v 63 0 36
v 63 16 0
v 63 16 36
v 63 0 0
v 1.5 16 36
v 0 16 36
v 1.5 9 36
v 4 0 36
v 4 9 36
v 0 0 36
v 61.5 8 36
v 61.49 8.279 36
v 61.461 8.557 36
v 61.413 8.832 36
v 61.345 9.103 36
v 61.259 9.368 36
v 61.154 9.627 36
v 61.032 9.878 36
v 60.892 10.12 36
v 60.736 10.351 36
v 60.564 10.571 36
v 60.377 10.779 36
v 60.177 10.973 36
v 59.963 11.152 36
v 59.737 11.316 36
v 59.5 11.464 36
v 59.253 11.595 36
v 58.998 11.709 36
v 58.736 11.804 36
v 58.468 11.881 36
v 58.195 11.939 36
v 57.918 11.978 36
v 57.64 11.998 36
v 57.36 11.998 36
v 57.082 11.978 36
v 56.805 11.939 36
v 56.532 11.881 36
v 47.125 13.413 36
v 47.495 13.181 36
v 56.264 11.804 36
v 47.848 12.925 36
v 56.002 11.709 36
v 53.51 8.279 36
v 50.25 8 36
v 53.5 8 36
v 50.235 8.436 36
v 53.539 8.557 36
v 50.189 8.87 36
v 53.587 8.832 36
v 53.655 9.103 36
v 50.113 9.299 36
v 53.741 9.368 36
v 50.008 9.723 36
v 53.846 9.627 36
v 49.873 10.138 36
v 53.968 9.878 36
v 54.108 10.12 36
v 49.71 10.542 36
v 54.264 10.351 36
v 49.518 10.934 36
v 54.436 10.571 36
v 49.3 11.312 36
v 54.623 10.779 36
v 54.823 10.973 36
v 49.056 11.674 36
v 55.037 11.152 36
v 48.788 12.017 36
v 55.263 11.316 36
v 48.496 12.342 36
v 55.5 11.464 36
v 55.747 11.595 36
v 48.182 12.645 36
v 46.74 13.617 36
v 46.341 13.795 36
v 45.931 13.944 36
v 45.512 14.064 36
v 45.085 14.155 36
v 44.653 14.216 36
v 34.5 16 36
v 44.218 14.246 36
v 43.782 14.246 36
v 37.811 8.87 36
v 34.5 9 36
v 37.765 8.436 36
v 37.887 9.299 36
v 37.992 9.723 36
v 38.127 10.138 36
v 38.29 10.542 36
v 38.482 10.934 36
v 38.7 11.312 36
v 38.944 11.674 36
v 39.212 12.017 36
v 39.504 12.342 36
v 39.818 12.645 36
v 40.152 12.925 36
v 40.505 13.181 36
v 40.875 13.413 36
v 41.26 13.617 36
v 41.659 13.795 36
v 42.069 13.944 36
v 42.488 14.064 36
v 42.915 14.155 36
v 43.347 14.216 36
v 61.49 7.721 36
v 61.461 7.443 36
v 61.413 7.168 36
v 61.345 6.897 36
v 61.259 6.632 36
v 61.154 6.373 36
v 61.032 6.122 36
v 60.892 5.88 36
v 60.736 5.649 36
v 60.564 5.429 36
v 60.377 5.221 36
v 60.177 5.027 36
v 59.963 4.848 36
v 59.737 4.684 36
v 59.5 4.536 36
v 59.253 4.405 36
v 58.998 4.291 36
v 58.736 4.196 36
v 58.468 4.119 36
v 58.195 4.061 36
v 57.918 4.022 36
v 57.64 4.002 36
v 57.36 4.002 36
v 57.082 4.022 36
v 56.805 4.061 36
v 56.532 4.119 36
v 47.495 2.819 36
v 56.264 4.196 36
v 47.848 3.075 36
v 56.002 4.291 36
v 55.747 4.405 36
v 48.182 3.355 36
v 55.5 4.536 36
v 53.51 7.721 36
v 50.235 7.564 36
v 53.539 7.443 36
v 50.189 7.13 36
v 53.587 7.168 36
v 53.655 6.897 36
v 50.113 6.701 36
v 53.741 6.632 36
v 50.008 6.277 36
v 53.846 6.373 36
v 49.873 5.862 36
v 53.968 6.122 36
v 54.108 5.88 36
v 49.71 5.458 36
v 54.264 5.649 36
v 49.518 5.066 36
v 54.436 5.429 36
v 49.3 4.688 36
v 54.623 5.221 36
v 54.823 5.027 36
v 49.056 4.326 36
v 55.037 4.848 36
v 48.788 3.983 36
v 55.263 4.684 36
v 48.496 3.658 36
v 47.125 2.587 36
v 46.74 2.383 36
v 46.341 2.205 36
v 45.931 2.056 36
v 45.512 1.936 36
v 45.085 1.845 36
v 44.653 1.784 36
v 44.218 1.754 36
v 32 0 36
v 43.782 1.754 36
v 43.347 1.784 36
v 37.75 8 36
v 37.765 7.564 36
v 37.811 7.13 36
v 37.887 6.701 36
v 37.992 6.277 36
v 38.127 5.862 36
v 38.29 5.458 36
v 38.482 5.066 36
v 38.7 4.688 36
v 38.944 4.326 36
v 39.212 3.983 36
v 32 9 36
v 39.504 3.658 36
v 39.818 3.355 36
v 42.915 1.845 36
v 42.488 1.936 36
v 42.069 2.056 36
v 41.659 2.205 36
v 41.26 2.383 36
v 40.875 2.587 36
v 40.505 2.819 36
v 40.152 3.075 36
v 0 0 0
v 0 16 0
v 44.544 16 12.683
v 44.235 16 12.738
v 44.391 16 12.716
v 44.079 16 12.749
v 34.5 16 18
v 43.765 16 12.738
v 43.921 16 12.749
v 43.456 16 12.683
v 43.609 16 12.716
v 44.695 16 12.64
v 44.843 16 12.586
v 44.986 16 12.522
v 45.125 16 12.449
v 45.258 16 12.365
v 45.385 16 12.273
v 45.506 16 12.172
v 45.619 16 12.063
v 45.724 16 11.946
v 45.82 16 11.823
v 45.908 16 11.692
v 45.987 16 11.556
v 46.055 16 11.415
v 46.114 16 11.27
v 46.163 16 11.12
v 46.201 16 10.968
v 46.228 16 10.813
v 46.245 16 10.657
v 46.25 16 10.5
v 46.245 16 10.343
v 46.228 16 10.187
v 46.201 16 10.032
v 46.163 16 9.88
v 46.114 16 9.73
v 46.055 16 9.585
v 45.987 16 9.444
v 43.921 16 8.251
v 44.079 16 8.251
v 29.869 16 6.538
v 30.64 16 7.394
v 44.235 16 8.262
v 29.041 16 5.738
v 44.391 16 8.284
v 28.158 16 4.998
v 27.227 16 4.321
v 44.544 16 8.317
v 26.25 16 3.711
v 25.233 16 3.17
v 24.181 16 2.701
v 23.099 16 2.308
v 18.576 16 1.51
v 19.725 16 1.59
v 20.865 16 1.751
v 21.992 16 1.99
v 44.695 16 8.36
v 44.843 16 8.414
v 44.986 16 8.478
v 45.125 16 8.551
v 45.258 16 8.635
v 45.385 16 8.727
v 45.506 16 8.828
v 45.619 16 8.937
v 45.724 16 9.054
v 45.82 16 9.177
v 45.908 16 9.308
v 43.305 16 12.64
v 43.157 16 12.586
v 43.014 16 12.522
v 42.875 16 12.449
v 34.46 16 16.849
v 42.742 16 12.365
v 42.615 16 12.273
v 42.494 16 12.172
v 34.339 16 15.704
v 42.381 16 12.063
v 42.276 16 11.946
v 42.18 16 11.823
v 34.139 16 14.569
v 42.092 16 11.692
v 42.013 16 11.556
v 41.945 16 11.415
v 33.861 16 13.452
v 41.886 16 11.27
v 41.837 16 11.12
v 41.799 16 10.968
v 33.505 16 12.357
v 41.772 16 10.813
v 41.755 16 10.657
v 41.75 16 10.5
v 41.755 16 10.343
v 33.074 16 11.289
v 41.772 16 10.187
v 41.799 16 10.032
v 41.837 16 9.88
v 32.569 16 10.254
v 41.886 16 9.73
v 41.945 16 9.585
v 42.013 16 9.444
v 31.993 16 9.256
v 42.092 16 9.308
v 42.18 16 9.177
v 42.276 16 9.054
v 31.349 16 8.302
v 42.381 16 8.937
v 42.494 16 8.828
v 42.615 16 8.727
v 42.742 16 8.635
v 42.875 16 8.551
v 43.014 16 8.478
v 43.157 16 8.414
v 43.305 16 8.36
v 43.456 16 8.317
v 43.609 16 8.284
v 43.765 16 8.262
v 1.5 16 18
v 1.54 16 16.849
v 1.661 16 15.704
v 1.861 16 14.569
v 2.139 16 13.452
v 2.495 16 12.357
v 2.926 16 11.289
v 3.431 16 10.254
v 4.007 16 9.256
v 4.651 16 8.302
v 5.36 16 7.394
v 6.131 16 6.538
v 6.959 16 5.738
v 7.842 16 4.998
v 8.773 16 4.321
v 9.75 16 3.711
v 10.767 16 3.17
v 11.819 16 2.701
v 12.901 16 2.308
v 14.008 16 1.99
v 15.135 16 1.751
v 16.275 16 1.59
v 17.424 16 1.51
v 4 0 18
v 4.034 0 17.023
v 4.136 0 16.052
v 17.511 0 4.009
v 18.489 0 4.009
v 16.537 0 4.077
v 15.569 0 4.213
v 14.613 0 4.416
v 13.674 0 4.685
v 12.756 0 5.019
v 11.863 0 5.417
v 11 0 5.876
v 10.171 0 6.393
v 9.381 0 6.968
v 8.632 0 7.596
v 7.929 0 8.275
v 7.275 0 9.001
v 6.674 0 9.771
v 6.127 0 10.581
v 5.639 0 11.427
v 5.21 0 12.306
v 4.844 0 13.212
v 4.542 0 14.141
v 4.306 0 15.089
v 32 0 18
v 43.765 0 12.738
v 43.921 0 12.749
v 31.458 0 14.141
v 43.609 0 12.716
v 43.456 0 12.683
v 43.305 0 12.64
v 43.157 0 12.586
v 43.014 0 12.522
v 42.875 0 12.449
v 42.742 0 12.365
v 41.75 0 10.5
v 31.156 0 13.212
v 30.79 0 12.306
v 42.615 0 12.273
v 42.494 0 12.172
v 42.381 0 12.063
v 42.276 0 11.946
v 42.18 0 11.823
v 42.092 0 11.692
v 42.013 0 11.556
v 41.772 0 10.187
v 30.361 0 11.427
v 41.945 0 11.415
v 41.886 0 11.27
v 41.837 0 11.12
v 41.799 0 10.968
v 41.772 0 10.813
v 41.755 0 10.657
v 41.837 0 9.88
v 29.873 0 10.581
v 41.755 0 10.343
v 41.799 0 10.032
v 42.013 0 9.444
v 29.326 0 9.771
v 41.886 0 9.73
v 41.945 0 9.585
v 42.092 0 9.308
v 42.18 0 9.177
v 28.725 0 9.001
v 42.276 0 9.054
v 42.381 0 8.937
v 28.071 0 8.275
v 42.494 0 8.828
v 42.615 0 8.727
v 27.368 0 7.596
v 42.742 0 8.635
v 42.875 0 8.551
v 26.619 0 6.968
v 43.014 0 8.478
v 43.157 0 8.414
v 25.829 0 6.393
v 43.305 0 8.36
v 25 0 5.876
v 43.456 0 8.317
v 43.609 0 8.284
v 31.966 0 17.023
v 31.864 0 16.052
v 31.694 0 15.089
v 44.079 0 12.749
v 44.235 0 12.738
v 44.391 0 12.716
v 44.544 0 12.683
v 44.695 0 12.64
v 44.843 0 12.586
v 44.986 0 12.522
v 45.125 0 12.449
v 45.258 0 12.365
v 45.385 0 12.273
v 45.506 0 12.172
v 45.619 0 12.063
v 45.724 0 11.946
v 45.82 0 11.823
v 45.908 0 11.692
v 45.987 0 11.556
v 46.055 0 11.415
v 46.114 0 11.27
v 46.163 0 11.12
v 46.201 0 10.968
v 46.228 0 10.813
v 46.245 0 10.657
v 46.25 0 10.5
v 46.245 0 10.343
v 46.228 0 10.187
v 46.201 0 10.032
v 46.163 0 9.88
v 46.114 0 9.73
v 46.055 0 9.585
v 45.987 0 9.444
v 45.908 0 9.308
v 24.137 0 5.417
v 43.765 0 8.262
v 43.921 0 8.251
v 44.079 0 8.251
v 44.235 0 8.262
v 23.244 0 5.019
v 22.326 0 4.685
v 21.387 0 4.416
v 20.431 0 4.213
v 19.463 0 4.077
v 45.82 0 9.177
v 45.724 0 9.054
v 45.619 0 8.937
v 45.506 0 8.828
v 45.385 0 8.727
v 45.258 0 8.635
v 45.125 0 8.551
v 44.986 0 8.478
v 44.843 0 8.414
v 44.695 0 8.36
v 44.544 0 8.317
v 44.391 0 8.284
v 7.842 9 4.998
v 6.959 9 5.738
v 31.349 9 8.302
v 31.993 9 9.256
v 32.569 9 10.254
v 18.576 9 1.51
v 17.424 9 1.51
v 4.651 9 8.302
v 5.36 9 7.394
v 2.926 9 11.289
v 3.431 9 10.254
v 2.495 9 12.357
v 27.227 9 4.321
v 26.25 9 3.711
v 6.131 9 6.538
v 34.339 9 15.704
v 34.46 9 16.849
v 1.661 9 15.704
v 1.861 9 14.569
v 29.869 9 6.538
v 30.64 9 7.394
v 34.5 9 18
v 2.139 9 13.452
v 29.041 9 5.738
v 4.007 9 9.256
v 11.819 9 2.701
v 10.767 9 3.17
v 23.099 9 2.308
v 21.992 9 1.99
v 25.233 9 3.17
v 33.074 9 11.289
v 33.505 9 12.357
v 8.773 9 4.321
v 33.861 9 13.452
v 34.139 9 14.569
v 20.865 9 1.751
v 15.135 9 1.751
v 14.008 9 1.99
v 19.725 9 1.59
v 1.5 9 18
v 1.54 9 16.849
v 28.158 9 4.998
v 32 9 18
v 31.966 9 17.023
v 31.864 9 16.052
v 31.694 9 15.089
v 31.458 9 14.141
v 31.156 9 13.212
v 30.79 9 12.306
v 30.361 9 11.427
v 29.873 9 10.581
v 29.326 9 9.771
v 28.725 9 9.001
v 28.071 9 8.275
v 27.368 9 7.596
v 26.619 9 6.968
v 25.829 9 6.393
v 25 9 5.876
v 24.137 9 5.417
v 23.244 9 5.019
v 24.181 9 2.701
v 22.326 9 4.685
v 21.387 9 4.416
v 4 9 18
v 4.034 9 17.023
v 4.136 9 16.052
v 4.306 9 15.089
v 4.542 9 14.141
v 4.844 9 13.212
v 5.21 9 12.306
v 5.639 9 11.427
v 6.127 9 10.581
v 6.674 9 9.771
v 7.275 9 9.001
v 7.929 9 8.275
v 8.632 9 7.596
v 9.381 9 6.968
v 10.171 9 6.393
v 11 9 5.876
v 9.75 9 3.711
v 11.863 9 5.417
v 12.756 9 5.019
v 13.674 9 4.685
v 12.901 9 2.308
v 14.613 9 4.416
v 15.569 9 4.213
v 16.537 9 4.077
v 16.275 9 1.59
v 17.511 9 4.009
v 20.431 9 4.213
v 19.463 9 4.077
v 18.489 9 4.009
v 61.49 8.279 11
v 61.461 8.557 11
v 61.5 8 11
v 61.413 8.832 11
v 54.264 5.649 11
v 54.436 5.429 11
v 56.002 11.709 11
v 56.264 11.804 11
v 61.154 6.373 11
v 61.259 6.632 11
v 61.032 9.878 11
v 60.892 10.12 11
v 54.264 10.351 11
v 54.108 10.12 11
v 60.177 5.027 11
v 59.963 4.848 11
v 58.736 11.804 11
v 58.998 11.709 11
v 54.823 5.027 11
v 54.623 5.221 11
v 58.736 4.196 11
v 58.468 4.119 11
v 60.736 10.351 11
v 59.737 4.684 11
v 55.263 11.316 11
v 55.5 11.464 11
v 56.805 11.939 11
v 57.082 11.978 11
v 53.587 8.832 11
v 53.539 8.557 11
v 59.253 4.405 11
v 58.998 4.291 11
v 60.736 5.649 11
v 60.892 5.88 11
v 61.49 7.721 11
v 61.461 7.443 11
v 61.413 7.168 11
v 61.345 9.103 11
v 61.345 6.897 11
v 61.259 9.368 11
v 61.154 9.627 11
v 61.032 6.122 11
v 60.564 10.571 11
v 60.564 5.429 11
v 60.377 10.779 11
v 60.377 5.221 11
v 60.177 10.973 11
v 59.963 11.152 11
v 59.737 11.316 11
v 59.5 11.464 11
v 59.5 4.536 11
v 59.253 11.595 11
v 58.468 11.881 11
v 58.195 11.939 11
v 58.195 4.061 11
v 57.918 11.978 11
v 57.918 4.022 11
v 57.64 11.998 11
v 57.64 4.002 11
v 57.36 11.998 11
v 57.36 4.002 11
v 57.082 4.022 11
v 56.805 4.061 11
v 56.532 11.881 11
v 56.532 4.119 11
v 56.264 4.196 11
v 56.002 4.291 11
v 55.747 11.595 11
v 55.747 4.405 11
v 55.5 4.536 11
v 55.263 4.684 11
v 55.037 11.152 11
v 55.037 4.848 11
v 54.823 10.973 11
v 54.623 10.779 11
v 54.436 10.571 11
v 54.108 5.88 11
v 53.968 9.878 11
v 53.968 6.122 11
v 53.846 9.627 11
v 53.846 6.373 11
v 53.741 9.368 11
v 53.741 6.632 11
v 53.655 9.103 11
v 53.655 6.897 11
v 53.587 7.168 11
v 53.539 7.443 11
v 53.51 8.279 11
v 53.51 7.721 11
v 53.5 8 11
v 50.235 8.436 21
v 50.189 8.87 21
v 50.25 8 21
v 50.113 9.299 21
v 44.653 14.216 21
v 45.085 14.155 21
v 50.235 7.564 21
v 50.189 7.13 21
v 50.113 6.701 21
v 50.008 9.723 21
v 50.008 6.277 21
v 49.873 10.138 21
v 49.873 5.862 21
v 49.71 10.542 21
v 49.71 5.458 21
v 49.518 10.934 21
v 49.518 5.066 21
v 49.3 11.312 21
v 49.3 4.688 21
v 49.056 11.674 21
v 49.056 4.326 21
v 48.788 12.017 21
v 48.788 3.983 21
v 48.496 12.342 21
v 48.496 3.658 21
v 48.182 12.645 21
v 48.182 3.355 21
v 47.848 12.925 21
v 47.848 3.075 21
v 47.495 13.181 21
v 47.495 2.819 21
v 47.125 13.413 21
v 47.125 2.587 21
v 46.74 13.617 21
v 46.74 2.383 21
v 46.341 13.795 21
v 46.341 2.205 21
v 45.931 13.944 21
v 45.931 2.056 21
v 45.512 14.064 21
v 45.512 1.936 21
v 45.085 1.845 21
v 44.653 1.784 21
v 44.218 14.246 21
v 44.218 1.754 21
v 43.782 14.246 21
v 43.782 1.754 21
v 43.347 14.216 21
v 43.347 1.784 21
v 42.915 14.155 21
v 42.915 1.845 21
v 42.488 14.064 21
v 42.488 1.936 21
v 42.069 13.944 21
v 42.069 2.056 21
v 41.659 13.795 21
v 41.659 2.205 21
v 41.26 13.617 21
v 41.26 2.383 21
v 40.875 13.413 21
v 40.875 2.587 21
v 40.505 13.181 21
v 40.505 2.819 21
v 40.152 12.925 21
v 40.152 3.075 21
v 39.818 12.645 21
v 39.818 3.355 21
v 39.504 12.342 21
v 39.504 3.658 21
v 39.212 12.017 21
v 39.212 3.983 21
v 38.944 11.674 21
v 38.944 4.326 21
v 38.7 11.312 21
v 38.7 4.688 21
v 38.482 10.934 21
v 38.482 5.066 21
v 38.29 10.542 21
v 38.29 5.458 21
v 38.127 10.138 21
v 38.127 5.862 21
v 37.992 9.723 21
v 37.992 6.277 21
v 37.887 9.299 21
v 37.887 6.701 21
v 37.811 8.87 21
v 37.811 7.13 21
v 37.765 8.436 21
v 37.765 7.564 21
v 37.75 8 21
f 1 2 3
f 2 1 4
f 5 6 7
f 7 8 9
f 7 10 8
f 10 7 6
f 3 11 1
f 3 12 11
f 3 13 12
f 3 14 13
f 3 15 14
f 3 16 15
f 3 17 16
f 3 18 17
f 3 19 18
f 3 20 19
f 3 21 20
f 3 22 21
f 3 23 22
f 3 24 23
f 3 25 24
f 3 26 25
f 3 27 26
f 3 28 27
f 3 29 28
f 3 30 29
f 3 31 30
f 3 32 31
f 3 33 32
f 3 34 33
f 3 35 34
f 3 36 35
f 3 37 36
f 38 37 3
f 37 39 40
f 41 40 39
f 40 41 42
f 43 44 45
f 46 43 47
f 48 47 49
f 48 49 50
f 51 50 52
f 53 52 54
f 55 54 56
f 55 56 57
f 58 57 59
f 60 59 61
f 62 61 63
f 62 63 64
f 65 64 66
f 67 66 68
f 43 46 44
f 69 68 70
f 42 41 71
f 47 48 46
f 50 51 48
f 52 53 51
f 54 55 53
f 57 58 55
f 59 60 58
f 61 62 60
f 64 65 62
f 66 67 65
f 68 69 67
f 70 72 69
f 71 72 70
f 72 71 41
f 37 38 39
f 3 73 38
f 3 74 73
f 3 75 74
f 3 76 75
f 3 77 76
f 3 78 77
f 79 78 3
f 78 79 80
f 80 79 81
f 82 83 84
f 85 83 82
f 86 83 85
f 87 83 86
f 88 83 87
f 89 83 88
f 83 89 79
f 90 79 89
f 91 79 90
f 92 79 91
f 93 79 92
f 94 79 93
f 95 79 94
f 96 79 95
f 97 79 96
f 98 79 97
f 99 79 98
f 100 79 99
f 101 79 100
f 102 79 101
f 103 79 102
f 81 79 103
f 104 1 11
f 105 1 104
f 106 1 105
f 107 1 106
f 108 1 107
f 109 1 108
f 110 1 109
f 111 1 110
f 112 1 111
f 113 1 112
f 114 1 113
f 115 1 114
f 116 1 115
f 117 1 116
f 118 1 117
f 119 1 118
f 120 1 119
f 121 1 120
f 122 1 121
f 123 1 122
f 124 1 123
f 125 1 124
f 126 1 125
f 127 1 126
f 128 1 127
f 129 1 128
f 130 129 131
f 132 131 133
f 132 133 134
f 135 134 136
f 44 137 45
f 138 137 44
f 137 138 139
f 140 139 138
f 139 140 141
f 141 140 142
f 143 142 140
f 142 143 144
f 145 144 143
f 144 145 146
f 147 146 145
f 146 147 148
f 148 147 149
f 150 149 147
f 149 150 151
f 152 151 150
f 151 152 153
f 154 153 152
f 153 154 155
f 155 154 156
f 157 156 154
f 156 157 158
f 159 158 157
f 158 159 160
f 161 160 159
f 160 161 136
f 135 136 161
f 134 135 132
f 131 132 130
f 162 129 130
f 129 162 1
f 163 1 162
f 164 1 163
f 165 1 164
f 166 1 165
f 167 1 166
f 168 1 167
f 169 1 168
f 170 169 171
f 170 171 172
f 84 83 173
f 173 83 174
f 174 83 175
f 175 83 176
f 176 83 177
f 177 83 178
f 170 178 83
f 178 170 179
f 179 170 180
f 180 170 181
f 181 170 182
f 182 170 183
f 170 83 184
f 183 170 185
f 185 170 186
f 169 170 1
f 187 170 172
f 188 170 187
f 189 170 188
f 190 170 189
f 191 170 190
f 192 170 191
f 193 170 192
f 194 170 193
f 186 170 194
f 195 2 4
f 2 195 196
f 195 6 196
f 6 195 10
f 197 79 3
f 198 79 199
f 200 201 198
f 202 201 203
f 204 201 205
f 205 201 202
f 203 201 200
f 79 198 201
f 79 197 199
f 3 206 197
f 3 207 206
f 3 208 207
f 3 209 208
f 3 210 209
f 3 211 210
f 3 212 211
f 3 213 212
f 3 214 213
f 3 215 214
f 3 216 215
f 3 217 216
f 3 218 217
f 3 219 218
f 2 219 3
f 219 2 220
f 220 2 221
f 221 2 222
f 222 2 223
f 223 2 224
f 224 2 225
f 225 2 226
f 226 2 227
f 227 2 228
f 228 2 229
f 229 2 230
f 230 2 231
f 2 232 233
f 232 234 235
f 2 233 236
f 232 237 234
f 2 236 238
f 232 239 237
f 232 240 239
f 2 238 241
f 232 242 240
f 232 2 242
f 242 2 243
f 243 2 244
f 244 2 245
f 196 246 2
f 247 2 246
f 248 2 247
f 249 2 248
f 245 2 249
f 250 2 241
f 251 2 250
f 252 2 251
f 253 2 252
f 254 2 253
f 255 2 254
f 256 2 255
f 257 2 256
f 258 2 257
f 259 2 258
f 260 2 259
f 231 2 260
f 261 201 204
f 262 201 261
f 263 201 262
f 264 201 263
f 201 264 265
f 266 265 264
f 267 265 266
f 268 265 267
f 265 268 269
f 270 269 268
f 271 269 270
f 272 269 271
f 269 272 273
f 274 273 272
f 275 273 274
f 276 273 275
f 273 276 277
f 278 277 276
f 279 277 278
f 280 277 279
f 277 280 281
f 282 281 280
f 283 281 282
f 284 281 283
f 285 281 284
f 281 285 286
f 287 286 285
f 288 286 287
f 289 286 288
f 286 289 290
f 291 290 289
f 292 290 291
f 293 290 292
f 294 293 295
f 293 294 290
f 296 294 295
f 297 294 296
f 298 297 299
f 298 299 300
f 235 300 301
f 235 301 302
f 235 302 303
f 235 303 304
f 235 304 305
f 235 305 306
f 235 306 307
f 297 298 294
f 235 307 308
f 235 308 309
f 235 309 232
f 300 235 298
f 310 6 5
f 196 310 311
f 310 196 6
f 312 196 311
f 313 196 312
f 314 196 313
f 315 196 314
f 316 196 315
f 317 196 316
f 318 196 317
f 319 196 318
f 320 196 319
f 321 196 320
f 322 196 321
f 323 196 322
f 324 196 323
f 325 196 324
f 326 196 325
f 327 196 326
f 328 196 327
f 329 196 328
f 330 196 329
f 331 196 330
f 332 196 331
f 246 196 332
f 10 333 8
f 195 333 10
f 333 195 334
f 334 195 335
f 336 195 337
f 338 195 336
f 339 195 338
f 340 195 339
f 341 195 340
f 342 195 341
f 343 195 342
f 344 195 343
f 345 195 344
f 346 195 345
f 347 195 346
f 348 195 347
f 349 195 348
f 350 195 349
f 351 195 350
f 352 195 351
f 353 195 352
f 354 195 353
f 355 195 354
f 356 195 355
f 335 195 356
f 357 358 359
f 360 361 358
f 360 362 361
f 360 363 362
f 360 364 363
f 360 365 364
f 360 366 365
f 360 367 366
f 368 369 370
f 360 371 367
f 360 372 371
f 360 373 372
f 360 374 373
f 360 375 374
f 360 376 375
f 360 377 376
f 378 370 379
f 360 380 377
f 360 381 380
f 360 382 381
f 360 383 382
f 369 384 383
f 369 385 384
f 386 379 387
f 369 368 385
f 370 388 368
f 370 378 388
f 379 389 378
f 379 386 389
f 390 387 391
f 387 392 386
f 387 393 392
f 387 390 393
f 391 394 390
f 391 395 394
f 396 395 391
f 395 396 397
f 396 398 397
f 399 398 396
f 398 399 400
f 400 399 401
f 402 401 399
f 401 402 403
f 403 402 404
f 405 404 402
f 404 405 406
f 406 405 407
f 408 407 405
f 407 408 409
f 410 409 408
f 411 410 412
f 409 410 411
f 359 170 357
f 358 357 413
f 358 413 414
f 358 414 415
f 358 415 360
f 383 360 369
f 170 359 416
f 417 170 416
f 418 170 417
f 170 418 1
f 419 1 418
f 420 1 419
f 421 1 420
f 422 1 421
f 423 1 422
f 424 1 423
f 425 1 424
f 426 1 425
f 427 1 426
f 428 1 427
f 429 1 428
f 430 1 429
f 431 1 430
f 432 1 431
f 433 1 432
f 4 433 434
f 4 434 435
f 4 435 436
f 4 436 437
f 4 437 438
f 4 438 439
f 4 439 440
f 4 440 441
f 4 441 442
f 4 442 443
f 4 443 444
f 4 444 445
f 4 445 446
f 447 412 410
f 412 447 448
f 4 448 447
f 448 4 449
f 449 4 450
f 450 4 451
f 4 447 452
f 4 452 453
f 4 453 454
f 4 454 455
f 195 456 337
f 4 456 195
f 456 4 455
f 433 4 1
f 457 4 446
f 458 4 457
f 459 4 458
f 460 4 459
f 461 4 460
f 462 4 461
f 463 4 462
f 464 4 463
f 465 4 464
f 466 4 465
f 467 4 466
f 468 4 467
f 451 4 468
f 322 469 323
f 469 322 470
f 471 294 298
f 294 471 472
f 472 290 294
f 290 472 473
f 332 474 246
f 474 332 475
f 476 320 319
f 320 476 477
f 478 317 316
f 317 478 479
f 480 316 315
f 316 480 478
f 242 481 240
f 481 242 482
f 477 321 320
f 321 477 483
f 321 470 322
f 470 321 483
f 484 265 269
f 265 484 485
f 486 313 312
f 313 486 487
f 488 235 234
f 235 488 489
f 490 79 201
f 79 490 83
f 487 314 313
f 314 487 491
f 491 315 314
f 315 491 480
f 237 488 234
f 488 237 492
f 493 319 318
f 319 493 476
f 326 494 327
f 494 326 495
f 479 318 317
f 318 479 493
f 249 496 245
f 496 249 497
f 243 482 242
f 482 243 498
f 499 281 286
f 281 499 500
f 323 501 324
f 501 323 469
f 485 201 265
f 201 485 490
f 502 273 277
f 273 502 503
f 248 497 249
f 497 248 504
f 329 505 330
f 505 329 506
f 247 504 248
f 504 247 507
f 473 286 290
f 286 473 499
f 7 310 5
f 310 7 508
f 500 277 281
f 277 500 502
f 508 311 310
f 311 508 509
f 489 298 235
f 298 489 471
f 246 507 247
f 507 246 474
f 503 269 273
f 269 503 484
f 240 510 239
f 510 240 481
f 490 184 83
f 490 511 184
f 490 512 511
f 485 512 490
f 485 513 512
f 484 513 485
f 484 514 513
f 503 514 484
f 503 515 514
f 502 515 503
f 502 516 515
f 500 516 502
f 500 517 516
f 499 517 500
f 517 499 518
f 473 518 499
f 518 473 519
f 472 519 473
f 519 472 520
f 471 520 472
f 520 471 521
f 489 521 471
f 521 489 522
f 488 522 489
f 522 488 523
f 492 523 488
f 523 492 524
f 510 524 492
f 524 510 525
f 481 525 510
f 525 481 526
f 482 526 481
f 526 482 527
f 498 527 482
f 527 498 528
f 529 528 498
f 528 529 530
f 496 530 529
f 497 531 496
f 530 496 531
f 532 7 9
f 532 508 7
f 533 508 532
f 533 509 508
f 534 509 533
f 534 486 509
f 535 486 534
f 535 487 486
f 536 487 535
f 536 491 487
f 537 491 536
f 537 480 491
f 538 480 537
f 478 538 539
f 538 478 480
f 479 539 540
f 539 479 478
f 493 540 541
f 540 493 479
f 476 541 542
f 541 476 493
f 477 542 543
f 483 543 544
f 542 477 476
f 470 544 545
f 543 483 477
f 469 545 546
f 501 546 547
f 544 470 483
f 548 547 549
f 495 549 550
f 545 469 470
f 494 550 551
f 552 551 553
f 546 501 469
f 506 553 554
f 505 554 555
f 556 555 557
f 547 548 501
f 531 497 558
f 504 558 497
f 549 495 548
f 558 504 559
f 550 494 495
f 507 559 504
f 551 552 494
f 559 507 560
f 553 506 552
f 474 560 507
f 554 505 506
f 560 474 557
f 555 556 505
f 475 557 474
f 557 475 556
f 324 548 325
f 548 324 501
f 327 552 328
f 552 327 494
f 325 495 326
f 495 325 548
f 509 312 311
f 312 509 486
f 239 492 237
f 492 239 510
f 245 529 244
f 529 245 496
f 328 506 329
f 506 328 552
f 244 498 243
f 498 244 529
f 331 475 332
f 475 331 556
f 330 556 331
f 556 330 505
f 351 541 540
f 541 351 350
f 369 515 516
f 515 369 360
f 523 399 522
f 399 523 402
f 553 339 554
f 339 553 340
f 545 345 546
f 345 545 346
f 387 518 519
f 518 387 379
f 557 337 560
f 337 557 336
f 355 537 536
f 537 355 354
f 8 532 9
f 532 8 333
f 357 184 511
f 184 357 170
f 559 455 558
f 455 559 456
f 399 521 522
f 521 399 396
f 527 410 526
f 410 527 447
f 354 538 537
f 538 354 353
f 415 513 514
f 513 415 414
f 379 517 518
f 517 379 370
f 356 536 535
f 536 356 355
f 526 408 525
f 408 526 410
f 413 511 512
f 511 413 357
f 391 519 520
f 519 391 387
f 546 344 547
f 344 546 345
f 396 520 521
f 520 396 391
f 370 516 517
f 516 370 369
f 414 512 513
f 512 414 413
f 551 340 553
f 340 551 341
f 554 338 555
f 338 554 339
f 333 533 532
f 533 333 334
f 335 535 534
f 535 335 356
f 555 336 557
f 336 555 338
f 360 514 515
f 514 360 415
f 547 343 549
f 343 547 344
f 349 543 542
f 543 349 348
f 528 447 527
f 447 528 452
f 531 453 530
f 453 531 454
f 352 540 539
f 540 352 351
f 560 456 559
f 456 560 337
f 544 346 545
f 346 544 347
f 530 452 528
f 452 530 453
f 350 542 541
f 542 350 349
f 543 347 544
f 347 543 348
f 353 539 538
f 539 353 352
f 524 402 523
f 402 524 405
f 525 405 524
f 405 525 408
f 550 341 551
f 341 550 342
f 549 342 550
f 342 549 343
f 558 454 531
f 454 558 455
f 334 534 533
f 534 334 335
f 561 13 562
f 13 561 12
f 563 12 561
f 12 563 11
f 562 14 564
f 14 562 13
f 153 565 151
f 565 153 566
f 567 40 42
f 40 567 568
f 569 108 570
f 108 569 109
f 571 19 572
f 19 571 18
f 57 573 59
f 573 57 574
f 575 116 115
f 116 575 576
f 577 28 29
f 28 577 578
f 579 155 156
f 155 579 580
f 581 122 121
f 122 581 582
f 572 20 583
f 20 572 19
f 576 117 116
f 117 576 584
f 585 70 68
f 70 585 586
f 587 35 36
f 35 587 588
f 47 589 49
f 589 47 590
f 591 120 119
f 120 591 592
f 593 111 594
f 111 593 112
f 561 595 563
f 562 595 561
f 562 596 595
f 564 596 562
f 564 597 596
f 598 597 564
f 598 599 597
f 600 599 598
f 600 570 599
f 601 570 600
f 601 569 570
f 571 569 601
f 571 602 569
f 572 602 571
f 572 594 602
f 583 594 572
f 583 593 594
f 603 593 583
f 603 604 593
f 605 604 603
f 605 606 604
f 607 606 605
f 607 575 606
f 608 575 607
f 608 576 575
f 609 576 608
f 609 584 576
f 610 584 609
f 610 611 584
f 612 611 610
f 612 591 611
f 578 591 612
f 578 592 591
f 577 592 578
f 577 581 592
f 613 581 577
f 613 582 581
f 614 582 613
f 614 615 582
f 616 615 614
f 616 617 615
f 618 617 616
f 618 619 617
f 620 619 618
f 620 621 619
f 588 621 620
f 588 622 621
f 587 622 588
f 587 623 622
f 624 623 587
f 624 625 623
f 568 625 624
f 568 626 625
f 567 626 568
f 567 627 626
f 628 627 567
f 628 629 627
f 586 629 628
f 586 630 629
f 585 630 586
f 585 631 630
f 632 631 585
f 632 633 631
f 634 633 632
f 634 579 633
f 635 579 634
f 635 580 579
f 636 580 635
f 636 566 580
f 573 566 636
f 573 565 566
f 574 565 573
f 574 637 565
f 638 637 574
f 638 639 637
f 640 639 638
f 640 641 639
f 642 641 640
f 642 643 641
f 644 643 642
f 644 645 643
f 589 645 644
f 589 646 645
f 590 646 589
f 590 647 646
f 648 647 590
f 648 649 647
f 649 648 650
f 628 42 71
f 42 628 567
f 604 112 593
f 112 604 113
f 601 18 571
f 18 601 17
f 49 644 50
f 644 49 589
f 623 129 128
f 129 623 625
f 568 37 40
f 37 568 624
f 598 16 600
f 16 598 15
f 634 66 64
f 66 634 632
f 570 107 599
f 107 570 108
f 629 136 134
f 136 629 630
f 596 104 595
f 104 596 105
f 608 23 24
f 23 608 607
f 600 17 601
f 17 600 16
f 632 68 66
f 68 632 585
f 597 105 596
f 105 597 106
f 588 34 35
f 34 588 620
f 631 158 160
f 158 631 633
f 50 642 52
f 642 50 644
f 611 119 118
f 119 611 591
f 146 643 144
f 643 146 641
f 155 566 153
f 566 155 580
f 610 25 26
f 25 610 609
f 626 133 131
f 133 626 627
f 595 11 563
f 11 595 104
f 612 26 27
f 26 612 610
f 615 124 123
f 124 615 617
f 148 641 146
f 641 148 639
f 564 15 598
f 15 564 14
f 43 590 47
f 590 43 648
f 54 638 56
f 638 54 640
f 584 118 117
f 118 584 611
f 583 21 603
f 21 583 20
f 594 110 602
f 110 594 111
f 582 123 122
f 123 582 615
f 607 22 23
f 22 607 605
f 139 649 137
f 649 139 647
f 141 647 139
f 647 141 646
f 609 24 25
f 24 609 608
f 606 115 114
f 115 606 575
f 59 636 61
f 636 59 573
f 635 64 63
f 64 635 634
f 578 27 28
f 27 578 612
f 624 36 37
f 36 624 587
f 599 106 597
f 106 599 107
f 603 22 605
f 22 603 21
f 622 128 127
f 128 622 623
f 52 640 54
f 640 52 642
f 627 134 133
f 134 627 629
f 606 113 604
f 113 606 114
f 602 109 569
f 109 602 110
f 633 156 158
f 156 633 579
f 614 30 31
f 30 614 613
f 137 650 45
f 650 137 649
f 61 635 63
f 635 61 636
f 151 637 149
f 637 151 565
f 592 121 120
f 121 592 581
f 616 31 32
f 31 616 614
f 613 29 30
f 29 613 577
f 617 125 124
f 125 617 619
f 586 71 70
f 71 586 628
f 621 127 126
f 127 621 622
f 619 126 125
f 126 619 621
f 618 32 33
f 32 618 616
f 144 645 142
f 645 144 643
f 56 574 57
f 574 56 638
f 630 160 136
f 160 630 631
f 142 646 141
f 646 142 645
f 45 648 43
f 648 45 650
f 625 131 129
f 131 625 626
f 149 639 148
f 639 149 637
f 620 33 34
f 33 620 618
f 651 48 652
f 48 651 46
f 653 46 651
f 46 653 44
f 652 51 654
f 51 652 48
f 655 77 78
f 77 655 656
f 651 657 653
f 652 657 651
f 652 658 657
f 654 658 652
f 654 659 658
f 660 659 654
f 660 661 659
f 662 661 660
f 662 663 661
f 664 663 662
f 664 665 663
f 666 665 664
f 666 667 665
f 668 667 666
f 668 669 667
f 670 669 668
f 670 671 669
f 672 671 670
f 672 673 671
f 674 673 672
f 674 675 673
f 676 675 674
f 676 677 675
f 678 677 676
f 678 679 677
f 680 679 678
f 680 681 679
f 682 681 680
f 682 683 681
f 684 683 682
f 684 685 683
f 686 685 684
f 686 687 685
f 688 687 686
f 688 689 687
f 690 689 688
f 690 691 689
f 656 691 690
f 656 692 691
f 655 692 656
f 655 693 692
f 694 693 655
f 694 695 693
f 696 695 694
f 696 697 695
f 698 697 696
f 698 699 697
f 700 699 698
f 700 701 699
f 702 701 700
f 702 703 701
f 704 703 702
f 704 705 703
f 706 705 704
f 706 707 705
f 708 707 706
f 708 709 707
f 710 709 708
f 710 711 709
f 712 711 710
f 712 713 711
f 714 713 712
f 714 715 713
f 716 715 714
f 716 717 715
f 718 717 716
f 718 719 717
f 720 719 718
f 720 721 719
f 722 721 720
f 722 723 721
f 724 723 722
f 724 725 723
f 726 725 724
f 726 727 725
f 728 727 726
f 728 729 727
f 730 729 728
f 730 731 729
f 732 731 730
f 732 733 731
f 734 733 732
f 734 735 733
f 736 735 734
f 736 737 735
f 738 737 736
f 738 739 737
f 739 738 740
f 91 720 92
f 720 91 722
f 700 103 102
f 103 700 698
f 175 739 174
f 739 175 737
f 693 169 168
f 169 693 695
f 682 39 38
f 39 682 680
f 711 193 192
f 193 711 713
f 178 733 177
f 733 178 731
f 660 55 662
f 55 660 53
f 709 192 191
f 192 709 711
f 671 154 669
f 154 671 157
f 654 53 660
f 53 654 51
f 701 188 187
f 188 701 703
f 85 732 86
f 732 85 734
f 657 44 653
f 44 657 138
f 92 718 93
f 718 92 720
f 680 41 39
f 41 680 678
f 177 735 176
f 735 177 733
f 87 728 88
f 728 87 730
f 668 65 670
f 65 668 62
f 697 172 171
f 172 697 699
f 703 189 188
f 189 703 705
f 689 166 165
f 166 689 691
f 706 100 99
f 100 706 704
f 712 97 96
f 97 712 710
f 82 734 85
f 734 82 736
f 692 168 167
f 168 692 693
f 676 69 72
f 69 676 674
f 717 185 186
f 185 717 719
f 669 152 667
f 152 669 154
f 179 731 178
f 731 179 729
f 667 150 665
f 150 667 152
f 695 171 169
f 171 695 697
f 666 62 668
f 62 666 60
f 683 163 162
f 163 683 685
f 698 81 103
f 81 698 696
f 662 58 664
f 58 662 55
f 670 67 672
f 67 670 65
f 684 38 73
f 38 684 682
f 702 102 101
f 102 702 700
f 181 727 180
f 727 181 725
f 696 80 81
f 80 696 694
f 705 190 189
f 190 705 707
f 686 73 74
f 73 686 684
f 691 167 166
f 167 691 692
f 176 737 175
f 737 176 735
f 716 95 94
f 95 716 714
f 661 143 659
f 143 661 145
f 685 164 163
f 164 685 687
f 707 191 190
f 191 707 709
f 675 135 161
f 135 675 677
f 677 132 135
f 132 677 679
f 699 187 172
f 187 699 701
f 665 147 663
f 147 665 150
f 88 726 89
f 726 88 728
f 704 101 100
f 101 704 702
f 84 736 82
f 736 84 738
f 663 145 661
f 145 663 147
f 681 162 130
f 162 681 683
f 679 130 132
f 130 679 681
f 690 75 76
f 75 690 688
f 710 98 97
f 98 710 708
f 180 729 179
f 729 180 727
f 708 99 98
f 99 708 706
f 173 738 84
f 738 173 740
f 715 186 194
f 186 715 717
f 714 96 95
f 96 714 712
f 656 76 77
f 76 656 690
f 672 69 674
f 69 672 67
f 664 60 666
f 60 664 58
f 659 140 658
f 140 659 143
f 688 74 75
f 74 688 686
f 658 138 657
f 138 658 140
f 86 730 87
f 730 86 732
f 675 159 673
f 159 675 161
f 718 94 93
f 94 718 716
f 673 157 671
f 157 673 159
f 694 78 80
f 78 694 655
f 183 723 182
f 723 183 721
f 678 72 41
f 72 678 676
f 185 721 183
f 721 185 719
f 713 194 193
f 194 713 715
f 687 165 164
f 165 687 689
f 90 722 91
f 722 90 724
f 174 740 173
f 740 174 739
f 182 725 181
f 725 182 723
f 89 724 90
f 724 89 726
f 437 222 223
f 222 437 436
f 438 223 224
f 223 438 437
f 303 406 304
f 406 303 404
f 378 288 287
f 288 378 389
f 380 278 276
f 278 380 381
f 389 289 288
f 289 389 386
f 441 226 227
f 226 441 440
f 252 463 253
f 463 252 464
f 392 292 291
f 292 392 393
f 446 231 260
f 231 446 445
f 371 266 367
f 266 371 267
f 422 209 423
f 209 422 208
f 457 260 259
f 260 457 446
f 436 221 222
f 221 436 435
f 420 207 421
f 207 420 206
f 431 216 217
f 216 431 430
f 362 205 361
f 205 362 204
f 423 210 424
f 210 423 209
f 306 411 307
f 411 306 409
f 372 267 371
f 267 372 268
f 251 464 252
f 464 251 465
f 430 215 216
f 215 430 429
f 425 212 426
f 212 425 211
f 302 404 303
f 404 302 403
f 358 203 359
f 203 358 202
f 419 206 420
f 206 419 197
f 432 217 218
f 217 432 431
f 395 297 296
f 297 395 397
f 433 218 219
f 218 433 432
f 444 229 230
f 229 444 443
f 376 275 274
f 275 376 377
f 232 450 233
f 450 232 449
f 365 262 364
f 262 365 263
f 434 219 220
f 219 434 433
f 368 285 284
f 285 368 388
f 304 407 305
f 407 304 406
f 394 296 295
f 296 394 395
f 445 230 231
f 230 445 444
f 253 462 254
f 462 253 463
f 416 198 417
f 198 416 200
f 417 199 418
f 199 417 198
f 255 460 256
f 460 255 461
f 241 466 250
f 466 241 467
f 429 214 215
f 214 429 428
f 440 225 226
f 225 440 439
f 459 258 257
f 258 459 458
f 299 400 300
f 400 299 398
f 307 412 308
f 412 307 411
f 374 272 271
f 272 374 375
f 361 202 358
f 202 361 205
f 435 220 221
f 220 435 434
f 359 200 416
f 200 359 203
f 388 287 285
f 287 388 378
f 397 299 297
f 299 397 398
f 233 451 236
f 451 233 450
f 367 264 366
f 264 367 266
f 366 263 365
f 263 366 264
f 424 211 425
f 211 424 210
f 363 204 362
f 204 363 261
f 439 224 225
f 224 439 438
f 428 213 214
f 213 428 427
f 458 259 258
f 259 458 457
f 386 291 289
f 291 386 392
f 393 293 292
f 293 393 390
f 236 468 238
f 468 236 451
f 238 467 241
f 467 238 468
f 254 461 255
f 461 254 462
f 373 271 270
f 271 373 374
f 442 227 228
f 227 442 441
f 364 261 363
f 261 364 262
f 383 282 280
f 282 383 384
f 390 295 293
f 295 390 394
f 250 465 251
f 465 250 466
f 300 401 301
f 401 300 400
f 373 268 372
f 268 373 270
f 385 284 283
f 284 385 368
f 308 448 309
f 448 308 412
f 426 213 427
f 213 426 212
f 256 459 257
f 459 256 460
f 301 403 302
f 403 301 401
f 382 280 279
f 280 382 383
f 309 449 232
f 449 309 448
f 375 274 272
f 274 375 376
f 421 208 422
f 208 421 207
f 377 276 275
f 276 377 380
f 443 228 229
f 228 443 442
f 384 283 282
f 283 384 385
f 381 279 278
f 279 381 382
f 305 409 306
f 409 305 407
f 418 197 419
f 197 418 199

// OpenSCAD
spring=8;
spring_h=25;

knob_head=16;
knob=12.5;
knob_h=15;

od=33;
id=28;

h=7;
wall=1.5;
pad=0.1;


x=od+spring+knob_head+wall*4;
y=knob_head;
z=od+wall*2;

screw=4.5;

$fn=90;

module slot() {
	module place() {
		translate([od/2+wall,y+pad,z/2])
		rotate([90,0])
		children();
	}
	hull() {
		place()
		children();
		translate([0,0,od])
		place()
		children();
	}
	
}

difference() {
	cube([x,y,z]);
	
	slot()
	cylinder(d=od,h=h+pad);
	slot()
	cylinder(d=id,h=y+pad*2);

	translate([od+wall*3+spring/2+knob_head,y/2,z-spring_h])
	cylinder(d=spring,h=spring_h+pad);

	translate([od+wall*2+knob_head/2,y/2,z-knob_h])
	cylinder(d=knob,h=knob_h+pad);

	translate([od+wall*2+knob_head/2,y+pad,(z-knob_h)/2])
	rotate([90,0])
	cylinder(d=screw,h=y+pad*2);
}
